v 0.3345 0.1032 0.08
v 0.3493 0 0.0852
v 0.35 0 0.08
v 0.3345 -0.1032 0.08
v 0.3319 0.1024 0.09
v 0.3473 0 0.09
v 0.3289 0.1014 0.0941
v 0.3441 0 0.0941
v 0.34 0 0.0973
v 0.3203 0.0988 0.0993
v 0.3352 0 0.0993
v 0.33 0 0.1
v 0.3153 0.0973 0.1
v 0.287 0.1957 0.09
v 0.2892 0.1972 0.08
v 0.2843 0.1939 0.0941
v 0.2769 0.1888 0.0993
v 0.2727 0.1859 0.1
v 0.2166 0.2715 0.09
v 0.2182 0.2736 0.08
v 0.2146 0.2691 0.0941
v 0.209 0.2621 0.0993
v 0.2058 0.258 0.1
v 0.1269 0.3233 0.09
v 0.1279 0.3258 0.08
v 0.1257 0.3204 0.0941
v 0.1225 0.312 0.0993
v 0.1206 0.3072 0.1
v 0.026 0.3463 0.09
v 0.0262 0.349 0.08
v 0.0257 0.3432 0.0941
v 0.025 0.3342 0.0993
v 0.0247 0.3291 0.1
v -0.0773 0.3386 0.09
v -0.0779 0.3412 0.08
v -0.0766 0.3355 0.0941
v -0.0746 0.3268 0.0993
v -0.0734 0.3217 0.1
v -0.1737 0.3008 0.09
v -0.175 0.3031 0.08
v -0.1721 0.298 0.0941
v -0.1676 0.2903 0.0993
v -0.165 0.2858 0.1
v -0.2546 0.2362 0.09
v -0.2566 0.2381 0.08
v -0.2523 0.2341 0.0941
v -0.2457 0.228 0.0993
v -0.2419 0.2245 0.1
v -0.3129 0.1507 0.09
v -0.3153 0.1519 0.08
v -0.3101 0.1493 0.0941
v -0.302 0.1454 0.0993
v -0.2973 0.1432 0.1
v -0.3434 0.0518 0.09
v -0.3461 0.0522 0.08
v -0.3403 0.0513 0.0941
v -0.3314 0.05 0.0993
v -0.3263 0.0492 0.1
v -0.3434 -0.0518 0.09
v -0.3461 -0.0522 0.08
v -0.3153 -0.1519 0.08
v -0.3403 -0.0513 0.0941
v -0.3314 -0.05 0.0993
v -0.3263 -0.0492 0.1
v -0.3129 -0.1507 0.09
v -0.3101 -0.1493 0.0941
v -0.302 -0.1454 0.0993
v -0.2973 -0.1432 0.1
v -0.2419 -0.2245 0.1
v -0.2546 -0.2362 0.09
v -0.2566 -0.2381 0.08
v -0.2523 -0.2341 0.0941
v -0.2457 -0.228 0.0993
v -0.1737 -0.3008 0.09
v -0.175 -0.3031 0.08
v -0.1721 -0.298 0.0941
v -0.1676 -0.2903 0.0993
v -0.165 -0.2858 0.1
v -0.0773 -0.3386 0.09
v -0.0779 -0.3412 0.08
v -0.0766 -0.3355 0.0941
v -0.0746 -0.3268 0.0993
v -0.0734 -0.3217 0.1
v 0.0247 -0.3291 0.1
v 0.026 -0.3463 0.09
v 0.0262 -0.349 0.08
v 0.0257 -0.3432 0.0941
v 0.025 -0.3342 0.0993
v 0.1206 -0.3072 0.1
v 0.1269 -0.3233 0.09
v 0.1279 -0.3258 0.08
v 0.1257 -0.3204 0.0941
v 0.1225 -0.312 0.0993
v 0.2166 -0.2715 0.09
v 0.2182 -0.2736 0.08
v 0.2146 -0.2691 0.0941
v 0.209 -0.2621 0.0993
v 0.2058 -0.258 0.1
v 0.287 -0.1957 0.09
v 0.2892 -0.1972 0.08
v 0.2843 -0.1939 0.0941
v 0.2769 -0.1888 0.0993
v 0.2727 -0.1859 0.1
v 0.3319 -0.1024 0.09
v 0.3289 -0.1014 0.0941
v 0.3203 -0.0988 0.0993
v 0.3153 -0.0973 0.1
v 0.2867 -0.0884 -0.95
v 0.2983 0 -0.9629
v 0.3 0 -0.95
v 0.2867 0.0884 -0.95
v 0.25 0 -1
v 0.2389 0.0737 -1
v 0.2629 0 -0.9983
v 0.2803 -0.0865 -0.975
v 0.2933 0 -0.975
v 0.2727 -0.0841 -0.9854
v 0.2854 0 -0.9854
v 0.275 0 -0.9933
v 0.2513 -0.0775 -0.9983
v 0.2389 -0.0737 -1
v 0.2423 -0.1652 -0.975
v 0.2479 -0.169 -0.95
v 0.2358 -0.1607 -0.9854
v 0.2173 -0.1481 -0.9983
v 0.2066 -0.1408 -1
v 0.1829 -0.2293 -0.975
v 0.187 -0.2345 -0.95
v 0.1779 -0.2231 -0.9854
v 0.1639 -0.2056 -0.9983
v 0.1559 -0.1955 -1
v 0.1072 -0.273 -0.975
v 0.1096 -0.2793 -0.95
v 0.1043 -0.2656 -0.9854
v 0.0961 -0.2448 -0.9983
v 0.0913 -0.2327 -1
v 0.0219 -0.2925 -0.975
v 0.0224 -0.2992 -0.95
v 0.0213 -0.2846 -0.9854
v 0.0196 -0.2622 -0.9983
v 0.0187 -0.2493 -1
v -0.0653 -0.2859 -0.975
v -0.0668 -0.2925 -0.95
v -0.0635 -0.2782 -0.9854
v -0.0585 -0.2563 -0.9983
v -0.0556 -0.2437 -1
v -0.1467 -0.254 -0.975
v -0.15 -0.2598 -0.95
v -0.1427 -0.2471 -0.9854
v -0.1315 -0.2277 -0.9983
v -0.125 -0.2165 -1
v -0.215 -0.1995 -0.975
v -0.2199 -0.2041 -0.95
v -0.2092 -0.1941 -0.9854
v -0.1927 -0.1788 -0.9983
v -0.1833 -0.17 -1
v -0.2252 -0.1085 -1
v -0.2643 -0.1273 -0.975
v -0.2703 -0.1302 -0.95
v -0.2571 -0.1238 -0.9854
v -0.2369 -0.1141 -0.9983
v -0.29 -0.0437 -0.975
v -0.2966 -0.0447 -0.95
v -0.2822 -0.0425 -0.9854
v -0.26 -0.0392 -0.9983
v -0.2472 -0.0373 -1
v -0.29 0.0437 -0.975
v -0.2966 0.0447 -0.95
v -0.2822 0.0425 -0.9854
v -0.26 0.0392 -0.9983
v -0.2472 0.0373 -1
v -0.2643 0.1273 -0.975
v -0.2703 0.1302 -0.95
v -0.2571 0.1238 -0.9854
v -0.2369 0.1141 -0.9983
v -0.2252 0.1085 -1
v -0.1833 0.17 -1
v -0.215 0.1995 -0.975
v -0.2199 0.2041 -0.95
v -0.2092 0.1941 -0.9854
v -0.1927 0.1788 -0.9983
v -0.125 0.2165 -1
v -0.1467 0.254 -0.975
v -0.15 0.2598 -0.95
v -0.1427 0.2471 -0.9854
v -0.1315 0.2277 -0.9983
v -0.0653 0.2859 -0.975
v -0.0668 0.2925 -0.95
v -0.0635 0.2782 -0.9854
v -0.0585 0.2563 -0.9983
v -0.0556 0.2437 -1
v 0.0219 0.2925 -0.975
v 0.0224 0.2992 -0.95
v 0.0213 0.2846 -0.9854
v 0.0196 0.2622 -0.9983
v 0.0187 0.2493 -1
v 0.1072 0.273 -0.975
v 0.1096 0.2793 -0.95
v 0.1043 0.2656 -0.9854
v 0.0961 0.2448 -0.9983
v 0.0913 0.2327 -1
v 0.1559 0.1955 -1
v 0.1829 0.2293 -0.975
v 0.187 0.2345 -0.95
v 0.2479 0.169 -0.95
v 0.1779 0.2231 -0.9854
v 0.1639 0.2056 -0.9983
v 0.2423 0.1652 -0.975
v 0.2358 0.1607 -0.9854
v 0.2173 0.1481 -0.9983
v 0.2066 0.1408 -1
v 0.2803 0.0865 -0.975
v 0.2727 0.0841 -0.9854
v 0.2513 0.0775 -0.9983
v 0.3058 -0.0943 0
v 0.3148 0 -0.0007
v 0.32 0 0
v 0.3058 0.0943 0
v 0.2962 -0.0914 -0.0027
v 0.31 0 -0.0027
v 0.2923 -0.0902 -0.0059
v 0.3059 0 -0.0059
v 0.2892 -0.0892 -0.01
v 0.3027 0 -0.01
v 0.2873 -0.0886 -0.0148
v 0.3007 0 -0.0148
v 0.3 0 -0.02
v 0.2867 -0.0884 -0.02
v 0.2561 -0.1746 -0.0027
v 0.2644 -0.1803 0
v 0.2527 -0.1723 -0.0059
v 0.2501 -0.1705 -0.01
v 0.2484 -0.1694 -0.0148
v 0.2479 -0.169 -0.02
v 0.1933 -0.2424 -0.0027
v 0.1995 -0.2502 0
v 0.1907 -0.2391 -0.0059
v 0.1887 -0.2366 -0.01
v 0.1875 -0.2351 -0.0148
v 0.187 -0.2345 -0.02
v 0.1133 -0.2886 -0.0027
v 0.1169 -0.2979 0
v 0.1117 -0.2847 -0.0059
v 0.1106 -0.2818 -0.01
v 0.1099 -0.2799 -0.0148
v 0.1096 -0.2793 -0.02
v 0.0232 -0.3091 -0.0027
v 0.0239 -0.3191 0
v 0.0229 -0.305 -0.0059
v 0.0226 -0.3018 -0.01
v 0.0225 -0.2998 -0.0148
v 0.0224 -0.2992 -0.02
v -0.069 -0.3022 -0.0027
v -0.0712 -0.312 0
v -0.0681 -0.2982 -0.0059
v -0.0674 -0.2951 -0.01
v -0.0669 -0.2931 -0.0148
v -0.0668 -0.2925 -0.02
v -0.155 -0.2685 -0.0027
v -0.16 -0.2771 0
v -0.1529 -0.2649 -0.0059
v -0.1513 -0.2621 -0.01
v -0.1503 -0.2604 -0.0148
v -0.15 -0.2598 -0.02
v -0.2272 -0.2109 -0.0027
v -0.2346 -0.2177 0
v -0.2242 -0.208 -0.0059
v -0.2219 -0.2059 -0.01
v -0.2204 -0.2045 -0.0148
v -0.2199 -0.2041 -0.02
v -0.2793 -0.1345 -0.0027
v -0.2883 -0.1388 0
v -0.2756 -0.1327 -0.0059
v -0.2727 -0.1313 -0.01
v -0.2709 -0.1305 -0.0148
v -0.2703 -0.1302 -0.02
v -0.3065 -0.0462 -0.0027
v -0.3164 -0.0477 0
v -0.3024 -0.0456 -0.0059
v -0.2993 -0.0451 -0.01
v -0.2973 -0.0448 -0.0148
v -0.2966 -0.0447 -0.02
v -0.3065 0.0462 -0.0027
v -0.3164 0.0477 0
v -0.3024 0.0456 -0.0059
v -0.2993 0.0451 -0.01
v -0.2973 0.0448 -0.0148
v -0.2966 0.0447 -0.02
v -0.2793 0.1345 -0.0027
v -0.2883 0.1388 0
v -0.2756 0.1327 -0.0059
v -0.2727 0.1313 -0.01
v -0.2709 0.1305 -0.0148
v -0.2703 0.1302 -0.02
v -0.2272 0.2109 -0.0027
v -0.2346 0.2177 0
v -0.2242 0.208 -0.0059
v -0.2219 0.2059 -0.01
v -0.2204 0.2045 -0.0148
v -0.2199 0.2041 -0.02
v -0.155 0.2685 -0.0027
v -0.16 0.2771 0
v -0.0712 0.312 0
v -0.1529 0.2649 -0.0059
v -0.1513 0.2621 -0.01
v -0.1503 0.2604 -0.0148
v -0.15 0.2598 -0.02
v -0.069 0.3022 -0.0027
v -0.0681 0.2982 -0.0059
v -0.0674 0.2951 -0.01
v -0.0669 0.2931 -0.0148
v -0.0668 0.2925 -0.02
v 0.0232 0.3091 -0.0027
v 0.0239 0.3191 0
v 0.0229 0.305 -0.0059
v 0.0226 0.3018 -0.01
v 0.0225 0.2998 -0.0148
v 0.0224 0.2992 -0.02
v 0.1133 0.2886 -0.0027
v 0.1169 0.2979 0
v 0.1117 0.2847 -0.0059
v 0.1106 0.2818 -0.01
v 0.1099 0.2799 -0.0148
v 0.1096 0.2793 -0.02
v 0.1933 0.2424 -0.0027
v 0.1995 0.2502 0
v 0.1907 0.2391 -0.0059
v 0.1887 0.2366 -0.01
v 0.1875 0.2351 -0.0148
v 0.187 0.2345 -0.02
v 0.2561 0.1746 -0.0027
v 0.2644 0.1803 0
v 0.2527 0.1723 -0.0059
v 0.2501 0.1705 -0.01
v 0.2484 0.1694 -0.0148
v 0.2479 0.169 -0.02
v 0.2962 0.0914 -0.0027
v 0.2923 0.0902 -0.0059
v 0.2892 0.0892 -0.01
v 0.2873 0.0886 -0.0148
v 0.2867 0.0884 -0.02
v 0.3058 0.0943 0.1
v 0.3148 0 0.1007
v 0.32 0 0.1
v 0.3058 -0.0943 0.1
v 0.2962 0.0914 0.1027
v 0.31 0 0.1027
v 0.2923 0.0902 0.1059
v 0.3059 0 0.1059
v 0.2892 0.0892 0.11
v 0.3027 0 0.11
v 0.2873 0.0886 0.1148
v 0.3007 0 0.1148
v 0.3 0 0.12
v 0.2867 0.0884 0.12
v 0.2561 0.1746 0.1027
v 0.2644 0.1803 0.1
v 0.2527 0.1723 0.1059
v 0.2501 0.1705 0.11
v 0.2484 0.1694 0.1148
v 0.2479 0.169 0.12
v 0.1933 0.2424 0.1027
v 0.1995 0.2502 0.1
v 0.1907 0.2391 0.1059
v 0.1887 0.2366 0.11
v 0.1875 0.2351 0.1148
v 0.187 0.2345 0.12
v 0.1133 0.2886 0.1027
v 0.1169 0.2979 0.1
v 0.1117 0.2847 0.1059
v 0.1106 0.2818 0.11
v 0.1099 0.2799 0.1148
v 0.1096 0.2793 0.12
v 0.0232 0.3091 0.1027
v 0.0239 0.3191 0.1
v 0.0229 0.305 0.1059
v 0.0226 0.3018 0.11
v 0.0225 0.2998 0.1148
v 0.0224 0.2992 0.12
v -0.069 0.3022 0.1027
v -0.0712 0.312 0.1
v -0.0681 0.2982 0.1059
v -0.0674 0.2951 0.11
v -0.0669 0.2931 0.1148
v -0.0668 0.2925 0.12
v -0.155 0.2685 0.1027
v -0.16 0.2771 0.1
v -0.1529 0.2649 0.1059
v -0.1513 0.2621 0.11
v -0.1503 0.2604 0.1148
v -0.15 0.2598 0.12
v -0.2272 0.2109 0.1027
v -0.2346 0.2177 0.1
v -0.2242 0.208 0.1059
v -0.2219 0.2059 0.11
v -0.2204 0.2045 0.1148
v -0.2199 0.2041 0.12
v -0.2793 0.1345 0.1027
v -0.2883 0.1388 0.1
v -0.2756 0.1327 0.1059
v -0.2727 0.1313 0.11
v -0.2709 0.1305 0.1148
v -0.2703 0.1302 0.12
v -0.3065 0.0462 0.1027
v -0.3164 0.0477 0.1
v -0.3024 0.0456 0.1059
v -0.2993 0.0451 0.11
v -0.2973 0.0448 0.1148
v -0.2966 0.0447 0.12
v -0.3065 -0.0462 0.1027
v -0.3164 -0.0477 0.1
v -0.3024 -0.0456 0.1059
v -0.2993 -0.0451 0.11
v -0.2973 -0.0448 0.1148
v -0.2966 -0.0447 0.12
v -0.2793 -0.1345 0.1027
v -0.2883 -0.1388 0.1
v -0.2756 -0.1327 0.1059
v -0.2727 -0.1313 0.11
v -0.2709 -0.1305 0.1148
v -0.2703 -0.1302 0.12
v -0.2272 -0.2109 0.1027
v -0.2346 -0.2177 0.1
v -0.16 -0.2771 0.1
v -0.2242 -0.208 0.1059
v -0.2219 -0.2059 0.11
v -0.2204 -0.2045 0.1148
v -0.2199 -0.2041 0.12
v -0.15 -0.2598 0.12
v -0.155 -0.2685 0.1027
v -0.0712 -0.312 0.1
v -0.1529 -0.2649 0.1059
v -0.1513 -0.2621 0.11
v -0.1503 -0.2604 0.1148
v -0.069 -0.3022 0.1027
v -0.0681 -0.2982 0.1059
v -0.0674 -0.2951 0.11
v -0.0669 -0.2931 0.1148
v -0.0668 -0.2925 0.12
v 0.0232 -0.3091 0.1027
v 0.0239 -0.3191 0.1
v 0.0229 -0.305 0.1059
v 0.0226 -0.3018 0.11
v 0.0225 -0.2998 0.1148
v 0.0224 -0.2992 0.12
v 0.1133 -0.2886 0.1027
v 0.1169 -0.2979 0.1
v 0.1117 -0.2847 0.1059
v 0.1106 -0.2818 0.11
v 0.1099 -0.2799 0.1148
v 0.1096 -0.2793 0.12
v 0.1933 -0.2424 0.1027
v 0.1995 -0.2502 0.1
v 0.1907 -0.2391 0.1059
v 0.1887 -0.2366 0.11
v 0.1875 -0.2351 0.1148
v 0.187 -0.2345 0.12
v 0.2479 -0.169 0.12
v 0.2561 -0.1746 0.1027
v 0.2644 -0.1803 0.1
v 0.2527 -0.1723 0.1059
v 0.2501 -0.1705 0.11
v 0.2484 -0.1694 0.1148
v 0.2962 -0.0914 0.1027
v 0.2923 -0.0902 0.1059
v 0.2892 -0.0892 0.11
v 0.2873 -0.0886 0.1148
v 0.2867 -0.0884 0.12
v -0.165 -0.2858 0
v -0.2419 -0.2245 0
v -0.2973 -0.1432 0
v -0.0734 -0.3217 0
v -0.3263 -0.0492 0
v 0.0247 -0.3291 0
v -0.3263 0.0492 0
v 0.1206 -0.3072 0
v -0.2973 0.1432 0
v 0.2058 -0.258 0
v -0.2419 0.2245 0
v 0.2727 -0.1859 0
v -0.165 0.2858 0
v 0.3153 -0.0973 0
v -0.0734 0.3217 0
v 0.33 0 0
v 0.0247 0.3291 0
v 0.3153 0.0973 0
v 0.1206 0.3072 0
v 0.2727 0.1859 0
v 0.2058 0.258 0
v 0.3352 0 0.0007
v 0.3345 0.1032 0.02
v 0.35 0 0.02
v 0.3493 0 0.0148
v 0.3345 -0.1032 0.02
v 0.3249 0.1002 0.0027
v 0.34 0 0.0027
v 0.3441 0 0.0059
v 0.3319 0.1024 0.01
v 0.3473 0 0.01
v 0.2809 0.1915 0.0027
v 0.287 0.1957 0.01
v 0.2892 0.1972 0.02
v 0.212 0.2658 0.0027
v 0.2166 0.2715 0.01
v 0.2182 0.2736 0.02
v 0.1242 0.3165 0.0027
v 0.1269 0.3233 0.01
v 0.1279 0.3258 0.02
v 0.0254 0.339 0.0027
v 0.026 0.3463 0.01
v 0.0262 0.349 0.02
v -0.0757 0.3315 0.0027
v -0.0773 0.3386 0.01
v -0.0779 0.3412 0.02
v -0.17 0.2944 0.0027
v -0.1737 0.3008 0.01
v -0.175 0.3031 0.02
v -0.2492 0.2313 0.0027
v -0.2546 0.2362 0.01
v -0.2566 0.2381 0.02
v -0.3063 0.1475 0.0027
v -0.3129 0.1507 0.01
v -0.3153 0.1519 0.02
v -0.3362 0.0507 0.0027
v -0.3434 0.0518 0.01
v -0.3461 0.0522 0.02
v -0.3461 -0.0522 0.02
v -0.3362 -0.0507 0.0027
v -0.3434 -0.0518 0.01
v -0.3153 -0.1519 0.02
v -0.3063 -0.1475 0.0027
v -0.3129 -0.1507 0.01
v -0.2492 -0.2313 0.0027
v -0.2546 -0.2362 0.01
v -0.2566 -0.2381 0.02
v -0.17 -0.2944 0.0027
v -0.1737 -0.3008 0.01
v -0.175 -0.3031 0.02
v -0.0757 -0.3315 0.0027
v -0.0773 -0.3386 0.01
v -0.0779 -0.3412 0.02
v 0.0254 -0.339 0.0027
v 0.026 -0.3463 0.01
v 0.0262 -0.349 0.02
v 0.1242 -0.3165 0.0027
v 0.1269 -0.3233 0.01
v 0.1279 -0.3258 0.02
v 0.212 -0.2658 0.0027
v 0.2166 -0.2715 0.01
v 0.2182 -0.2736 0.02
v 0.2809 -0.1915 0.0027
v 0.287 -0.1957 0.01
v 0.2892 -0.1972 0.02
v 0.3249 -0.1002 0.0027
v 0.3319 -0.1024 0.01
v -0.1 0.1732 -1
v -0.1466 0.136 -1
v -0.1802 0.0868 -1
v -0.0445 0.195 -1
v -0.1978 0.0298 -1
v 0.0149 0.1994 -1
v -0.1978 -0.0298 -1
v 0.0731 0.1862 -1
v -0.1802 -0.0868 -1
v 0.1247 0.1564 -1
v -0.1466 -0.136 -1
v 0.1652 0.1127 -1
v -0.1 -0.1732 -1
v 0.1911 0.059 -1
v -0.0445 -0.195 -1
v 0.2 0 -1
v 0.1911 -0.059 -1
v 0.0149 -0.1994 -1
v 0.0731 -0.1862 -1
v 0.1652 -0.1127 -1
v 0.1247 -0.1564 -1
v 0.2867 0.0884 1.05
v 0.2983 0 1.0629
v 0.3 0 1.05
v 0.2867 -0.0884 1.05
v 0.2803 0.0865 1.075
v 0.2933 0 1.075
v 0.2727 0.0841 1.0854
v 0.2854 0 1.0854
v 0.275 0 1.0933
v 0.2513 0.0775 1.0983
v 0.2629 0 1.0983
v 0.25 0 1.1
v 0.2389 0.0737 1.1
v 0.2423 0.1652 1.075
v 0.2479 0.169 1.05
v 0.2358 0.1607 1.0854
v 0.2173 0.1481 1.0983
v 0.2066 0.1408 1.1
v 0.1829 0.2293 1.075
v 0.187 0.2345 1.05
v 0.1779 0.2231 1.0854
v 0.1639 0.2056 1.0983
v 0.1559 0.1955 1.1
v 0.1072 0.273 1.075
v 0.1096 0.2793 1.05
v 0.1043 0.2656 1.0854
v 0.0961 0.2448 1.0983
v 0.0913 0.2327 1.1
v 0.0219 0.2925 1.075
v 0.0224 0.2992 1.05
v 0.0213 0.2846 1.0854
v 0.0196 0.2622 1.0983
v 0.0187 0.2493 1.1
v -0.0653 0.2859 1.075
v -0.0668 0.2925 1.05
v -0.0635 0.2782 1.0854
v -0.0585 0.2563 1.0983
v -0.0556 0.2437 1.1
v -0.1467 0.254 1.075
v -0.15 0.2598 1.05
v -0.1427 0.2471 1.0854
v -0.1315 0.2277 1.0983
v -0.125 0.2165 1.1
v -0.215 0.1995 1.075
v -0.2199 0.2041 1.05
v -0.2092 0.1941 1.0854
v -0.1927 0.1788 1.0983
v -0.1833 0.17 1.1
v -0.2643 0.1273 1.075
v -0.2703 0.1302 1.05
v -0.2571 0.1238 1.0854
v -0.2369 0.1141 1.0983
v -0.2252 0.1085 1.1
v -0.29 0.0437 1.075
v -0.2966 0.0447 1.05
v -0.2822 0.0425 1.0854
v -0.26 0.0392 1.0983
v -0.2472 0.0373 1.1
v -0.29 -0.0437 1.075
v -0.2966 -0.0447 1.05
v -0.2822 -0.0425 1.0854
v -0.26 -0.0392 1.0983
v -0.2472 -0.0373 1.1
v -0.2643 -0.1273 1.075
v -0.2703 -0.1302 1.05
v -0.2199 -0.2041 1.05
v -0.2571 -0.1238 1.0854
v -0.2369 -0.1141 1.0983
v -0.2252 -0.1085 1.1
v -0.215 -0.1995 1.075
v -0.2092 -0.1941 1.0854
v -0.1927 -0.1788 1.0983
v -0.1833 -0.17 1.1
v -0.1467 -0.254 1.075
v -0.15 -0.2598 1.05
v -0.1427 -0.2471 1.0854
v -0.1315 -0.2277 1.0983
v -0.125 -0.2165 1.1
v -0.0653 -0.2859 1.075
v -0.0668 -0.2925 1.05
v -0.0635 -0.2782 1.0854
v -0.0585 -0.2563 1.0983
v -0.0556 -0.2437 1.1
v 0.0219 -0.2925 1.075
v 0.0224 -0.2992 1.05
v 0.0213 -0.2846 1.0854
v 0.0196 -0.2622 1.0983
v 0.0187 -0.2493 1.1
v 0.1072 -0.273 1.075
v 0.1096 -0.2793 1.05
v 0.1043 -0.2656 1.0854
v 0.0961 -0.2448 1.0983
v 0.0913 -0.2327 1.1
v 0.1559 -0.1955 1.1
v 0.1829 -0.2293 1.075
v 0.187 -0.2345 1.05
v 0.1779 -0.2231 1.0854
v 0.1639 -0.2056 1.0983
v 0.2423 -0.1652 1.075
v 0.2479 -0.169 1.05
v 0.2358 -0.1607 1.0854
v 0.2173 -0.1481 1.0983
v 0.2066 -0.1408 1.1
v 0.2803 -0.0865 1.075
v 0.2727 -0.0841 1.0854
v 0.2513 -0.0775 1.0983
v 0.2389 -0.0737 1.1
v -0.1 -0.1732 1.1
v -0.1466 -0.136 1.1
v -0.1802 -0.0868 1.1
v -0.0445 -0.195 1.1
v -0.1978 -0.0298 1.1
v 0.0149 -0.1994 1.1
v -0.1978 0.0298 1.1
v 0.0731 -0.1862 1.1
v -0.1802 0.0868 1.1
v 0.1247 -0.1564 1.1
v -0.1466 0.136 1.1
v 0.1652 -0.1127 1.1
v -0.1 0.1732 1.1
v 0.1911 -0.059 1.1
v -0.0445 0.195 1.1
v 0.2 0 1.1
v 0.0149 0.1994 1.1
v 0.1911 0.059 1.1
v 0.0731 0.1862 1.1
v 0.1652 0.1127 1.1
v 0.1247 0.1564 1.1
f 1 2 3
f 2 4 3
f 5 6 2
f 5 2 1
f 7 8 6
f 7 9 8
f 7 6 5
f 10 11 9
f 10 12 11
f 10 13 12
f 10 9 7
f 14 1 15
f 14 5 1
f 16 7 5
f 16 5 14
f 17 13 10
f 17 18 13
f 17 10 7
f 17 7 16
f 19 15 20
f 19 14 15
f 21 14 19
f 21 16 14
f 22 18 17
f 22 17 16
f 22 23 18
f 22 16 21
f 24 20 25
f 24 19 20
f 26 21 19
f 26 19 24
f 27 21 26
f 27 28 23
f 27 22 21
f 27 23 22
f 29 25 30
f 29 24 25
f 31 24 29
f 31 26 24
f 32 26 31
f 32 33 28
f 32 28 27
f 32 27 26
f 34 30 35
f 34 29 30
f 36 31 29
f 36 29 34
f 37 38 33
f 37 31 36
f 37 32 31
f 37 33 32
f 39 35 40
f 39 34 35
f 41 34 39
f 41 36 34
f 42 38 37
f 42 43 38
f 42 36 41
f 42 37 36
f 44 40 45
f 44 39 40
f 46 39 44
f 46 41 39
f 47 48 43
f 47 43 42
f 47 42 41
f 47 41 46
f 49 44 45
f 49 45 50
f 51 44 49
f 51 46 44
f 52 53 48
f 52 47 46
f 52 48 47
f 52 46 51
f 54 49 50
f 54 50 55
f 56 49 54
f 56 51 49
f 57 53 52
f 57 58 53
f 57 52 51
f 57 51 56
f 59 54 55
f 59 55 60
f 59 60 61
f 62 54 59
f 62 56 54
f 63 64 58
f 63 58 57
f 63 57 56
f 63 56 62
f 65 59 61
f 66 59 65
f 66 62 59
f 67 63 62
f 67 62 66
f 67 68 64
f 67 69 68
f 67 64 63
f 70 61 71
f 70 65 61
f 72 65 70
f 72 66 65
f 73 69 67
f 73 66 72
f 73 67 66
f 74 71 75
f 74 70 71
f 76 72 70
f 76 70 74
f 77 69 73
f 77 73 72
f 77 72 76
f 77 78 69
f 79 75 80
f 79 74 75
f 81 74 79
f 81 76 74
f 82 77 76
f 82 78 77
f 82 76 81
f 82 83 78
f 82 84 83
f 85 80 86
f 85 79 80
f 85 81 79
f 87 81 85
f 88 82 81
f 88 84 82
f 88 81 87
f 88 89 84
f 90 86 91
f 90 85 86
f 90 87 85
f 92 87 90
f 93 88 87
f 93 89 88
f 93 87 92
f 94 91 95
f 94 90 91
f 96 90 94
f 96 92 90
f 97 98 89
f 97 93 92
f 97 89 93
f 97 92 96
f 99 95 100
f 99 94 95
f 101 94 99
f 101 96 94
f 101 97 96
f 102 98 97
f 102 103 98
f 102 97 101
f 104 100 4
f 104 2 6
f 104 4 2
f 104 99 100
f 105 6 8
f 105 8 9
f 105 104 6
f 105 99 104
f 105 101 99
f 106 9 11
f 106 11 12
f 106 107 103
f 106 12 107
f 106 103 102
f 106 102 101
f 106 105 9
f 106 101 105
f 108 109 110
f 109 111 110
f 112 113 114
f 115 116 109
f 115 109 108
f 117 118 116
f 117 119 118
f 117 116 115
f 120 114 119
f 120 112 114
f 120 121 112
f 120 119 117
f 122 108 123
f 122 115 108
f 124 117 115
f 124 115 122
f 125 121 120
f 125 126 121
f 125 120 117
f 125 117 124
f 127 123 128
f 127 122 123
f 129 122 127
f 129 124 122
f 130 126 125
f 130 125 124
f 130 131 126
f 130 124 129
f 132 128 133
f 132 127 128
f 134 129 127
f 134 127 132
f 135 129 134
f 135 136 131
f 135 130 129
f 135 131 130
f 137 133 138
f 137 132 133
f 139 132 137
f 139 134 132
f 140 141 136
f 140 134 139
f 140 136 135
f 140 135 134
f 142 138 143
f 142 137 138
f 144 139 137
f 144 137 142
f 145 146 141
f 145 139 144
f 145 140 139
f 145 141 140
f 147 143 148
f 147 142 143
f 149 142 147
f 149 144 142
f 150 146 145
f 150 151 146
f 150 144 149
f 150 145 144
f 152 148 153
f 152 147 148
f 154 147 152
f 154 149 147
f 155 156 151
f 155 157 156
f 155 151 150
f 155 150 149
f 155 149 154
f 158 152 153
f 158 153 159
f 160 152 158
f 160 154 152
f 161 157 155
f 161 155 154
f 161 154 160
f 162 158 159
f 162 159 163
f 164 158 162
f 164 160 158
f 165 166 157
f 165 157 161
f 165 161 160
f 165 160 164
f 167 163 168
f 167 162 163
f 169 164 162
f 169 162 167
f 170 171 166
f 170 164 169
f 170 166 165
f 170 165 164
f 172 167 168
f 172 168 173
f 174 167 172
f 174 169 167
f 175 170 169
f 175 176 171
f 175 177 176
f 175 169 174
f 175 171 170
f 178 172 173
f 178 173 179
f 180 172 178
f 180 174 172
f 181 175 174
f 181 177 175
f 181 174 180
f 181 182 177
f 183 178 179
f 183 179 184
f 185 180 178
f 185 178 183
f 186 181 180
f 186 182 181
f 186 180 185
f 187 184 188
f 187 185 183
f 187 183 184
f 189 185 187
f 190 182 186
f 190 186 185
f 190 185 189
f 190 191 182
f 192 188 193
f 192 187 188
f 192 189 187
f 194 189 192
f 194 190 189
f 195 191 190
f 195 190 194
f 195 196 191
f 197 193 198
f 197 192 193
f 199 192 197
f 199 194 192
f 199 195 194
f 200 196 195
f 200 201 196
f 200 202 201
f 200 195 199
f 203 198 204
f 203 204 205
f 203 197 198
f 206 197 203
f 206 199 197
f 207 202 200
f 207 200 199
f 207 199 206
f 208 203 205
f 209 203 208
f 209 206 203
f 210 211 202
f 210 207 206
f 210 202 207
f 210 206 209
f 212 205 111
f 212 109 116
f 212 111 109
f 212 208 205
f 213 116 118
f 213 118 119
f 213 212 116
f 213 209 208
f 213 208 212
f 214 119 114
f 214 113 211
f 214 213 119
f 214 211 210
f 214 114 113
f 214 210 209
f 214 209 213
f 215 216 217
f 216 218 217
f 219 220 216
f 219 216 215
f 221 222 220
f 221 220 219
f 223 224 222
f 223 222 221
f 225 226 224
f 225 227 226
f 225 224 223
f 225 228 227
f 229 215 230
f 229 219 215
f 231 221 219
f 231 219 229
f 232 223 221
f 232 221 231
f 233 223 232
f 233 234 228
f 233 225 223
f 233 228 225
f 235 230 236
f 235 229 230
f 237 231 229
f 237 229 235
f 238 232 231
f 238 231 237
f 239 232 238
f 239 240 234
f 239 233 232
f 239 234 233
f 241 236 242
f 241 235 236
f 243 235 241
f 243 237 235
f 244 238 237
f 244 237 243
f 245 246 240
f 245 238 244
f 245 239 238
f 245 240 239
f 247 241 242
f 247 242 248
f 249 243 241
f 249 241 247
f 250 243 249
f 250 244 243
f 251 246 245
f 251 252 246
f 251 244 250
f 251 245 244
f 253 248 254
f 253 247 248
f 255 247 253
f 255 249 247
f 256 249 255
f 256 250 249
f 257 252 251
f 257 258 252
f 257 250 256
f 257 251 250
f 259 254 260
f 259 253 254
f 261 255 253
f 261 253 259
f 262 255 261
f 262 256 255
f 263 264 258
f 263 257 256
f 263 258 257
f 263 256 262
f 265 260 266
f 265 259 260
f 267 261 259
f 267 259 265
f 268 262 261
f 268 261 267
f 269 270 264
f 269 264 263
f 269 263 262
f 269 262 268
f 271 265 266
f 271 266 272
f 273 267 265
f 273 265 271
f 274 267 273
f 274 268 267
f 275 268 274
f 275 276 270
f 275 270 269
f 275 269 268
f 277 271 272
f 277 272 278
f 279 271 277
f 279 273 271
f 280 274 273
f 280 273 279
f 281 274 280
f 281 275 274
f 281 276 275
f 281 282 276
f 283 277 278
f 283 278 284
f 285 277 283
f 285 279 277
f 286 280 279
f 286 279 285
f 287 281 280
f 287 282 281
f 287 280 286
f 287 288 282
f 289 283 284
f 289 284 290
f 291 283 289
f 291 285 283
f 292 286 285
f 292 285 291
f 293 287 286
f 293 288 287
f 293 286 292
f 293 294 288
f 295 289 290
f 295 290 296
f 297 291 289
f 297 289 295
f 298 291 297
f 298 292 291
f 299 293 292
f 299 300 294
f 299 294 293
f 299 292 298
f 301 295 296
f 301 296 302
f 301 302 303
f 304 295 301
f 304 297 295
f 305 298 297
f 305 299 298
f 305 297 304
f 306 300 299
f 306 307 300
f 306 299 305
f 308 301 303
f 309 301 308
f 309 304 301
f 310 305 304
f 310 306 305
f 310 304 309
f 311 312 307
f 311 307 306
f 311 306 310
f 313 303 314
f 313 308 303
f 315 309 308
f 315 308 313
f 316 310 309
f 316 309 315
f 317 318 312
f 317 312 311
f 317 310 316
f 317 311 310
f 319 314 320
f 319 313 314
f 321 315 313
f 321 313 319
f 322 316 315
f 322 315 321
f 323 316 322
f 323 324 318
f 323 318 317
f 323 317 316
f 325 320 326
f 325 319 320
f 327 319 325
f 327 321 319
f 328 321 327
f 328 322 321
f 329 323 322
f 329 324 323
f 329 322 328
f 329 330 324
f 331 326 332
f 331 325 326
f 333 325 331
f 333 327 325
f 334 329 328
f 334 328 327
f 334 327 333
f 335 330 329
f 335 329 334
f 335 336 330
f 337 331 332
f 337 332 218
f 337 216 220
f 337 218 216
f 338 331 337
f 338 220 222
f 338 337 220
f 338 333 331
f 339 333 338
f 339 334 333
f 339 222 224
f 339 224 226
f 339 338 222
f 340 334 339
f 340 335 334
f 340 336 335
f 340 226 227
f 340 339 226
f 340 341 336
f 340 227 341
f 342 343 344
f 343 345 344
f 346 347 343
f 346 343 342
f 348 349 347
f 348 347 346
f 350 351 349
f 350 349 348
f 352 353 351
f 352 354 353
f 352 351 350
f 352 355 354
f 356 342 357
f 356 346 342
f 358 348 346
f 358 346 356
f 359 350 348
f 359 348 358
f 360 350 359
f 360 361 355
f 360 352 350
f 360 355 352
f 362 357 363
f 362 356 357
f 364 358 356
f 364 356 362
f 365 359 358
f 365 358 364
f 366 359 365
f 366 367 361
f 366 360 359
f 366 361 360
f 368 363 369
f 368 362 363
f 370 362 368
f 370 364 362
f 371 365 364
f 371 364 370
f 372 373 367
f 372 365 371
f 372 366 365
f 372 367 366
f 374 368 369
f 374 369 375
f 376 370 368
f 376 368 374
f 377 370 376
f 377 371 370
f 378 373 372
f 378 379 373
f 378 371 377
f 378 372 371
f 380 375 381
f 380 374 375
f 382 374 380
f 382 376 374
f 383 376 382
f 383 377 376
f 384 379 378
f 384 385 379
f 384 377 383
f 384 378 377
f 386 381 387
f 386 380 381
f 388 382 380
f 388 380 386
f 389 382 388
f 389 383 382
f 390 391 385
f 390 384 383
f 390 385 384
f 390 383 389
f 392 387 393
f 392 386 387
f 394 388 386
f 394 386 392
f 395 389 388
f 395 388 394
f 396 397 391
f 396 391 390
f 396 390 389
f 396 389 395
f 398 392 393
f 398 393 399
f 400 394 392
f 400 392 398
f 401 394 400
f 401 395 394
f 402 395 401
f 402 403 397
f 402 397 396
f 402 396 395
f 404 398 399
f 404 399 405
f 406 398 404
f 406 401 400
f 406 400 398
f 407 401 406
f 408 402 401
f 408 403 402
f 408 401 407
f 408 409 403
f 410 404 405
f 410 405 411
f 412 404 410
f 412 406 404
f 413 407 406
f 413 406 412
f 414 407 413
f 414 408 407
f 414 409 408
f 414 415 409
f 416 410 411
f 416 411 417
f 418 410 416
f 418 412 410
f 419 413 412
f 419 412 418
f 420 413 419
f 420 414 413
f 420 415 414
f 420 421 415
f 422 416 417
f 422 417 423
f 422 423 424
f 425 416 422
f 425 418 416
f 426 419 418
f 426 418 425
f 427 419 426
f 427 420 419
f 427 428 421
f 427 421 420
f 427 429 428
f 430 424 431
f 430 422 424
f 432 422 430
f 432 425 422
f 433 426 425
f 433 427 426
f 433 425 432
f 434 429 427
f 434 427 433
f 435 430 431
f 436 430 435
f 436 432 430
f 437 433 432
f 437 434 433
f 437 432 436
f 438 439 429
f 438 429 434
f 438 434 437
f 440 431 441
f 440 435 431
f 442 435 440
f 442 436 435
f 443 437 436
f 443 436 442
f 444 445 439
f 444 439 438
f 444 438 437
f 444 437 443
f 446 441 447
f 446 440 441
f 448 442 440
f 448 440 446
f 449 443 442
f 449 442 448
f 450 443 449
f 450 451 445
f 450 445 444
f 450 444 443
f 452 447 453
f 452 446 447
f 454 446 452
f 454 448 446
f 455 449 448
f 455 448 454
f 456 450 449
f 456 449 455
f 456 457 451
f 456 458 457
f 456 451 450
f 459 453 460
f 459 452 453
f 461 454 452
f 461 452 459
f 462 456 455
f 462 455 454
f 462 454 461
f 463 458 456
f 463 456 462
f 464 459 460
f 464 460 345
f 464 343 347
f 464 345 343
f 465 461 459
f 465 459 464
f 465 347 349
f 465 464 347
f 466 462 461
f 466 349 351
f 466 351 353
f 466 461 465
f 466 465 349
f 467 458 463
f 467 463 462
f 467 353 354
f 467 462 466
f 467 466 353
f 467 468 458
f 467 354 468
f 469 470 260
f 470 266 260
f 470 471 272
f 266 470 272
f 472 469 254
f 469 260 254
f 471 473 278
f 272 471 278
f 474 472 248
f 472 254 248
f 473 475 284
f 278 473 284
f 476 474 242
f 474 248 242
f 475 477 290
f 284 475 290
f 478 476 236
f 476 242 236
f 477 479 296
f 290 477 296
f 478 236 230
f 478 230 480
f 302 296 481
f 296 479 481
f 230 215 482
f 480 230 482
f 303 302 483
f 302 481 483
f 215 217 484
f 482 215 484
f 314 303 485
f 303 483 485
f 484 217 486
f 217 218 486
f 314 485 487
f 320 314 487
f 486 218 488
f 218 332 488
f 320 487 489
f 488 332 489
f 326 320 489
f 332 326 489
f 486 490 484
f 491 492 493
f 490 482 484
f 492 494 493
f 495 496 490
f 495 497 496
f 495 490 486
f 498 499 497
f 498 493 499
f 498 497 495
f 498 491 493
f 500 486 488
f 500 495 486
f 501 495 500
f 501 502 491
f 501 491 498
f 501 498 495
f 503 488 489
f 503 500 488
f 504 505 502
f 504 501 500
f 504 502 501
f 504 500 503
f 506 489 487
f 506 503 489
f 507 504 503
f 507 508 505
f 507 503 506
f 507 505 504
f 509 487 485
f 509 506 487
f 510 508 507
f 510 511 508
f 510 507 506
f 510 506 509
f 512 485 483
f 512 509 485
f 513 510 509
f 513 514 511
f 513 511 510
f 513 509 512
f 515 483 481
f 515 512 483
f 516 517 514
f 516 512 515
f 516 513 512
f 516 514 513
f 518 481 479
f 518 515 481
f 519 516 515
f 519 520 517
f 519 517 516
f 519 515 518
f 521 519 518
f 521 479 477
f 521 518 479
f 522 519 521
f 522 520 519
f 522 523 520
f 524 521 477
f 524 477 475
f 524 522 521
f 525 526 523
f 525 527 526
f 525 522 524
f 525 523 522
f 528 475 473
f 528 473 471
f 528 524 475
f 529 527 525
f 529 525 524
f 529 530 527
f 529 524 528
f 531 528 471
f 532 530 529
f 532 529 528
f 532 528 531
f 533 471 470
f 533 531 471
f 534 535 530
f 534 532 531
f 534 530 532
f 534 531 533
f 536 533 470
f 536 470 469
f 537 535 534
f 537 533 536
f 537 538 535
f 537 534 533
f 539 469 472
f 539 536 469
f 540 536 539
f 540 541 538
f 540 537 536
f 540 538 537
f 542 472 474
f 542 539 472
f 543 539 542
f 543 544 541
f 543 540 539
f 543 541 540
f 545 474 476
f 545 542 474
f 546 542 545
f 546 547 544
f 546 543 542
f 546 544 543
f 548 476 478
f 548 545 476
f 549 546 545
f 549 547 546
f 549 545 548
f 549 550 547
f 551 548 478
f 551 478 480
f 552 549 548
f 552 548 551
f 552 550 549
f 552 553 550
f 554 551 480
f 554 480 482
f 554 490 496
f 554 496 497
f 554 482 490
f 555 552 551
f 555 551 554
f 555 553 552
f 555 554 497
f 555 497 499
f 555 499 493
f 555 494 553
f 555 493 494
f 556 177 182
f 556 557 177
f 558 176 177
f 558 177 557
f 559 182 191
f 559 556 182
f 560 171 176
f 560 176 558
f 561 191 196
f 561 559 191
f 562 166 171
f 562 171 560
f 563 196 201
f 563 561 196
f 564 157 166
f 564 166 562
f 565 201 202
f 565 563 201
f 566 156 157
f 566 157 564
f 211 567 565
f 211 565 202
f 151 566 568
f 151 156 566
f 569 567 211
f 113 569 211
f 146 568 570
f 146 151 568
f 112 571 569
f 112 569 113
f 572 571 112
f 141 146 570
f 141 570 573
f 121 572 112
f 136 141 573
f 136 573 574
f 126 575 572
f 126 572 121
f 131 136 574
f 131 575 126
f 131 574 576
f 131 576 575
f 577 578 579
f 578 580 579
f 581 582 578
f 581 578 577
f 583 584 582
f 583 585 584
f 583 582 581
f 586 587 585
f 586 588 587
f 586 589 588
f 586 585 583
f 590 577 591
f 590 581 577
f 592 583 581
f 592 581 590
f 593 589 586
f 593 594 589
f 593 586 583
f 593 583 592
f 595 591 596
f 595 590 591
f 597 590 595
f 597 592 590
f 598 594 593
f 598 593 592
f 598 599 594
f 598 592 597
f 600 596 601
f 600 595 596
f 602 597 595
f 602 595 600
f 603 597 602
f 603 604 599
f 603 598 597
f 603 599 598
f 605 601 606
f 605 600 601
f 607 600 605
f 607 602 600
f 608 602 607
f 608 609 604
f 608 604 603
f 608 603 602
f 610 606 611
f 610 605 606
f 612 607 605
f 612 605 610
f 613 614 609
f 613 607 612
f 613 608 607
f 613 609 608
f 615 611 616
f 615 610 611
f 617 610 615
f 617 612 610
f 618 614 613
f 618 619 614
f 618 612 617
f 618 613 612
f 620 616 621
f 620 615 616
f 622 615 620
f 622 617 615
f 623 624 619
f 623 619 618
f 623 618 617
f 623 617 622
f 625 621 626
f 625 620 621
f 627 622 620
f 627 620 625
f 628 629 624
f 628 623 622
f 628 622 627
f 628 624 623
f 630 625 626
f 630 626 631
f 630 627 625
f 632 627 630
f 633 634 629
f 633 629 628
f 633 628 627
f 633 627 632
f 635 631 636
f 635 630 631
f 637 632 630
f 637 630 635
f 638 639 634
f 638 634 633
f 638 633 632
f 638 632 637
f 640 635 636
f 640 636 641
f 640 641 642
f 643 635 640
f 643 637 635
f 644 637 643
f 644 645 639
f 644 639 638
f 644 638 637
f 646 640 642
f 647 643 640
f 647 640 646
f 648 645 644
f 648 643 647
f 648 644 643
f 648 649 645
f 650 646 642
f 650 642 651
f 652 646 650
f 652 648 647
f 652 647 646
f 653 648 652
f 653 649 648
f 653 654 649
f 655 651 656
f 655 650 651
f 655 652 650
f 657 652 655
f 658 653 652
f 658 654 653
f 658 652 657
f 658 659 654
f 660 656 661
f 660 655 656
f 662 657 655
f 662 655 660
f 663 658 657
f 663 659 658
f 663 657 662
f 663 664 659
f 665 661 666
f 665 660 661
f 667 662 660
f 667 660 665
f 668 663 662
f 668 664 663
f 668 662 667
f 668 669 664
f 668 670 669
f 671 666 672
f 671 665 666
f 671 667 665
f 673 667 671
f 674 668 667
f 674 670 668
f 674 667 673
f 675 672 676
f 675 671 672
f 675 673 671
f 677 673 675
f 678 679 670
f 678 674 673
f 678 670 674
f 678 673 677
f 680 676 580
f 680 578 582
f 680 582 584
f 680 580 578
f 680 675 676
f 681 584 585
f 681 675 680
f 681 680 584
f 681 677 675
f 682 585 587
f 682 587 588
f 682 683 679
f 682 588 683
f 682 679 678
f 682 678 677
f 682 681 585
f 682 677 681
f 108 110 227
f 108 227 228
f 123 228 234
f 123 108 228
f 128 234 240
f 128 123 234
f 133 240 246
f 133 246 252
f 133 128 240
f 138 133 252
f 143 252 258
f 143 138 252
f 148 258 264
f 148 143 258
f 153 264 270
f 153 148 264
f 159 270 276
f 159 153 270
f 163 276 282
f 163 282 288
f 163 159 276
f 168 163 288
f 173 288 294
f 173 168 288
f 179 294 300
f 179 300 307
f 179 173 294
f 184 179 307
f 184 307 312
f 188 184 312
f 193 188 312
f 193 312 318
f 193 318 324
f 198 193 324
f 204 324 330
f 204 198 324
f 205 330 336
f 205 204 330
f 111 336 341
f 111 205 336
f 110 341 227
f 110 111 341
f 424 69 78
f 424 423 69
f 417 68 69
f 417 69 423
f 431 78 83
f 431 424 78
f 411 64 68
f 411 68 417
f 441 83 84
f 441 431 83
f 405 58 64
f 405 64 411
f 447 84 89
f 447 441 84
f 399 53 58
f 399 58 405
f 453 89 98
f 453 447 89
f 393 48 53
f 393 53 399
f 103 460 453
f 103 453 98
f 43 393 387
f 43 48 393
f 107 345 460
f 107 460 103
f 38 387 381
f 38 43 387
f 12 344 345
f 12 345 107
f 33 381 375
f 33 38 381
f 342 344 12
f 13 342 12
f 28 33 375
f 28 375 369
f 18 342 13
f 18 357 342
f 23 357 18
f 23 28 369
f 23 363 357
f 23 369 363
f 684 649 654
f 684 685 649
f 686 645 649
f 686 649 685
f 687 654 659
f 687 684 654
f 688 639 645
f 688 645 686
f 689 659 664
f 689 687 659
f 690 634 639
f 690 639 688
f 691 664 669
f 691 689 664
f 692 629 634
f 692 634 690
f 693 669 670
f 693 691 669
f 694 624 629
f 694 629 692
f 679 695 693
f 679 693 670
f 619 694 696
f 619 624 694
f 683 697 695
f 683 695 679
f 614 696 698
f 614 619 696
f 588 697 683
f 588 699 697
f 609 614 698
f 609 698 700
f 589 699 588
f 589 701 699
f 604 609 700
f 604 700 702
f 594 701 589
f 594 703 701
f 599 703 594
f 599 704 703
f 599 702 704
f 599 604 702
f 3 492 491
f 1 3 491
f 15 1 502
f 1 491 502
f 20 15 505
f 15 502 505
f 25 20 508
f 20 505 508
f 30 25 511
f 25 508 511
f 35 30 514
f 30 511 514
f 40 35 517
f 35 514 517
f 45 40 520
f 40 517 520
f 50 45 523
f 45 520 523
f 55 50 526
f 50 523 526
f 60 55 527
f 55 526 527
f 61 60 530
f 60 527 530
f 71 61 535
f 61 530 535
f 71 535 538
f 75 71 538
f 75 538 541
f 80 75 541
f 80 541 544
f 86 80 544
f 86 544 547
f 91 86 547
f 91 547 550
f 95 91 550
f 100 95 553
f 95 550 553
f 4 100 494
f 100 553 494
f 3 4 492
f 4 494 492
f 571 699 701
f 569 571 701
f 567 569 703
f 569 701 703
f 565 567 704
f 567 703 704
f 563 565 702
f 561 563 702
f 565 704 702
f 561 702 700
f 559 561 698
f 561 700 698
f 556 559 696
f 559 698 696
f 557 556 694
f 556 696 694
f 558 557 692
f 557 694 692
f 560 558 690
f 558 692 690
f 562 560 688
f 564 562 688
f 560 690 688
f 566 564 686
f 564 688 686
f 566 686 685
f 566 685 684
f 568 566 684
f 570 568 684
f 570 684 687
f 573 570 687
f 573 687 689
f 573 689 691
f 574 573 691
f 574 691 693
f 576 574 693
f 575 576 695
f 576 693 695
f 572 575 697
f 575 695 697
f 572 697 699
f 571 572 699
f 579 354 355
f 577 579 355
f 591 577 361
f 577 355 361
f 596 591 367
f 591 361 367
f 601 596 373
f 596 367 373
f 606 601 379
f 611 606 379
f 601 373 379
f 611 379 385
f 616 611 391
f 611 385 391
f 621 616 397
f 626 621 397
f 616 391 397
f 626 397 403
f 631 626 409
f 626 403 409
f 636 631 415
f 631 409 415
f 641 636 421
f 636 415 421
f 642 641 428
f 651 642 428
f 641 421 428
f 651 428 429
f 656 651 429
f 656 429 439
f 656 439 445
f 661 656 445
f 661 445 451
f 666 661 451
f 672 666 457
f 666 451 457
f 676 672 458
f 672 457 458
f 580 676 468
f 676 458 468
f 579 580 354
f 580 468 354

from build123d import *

# Parameters (mm, degrees)
SKETCH1_R           = 0.35
BOSS_EXTRUDE2_DEPTH = 0.1
SKETCH4_R           = 0.3
BOSS_EXTRUDE3_DEPTH = 1
BOSS_EXTRUDE4_START = 1
SKETCH5_R           = 0.3
BOSS_EXTRUDE4_DEPTH = 1
FILLET1_R           = 0.05
FILLET2_R           = 0.05
FILLET3_R           = 0.02
FILLET4_R           = 0.02
FILLET5_R           = 0.02
FILLET6_R           = 0.02
SKETCH6_R           = 0.2
CUT_EXTRUDE1_DEPTH  = 2.1


with BuildPart() as part:
    # Sketch1 → Boss-Extrude2 (new body)
    with BuildSketch(Plane.XY):
        Circle(SKETCH1_R)
    extrude(amount=BOSS_EXTRUDE2_DEPTH)

    # Sketch4 → Boss-Extrude3 (add)
    with BuildSketch(Plane.XY.offset(0.1)):
        Circle(SKETCH4_R)
    extrude(amount=BOSS_EXTRUDE3_DEPTH)

    # Sketch5 → Boss-Extrude4 (add)
    with BuildSketch(Plane(origin=(0, 0, 0), x_dir=(-1, 0, 0), z_dir=(0, 0, -1)).offset(BOSS_EXTRUDE4_START)):
        with Locations(Location((0, 0, 0), (0, 0, 180))):
            Circle(SKETCH5_R)
    extrude(amount=-BOSS_EXTRUDE4_DEPTH)

    # Fillet1
    fillet1_edges = [part.edges().sort_by_distance(p)[0] for p in [
        (-0.3, 0, 1.1),
    ]]
    fillet(fillet1_edges, radius=FILLET1_R)

    # Fillet2
    fillet2_edges = [part.edges().sort_by_distance(p)[0] for p in [
        (-0.3, 0, -1),
    ]]
    fillet(fillet2_edges, radius=FILLET2_R)

    # Fillet3
    fillet3_edges = [part.edges().sort_by_distance(p)[0] for p in [
        (-0.35, 0, 0.1),
    ]]
    fillet(fillet3_edges, radius=FILLET3_R)

    # Fillet4
    fillet4_edges = [part.edges().sort_by_distance(p)[0] for p in [
        (-0.3, 0, 0),
    ]]
    fillet(fillet4_edges, radius=FILLET4_R)

    # Fillet5
    fillet5_edges = [part.edges().sort_by_distance(p)[0] for p in [
        (-0.35, 0, 0),
    ]]
    fillet(fillet5_edges, radius=FILLET5_R)

    # Fillet6
    fillet6_edges = [part.edges().sort_by_distance(p)[0] for p in [
        (-0.3, 0, 0.1),
    ]]
    fillet(fillet6_edges, radius=FILLET6_R)

    # Sketch6 → Cut-Extrude1 (cut)
    with BuildSketch(Plane.XY.offset(1.1)):
        Circle(SKETCH6_R)
    extrude(amount=-CUT_EXTRUDE1_DEPTH, mode=Mode.SUBTRACT)


solid = part.part
